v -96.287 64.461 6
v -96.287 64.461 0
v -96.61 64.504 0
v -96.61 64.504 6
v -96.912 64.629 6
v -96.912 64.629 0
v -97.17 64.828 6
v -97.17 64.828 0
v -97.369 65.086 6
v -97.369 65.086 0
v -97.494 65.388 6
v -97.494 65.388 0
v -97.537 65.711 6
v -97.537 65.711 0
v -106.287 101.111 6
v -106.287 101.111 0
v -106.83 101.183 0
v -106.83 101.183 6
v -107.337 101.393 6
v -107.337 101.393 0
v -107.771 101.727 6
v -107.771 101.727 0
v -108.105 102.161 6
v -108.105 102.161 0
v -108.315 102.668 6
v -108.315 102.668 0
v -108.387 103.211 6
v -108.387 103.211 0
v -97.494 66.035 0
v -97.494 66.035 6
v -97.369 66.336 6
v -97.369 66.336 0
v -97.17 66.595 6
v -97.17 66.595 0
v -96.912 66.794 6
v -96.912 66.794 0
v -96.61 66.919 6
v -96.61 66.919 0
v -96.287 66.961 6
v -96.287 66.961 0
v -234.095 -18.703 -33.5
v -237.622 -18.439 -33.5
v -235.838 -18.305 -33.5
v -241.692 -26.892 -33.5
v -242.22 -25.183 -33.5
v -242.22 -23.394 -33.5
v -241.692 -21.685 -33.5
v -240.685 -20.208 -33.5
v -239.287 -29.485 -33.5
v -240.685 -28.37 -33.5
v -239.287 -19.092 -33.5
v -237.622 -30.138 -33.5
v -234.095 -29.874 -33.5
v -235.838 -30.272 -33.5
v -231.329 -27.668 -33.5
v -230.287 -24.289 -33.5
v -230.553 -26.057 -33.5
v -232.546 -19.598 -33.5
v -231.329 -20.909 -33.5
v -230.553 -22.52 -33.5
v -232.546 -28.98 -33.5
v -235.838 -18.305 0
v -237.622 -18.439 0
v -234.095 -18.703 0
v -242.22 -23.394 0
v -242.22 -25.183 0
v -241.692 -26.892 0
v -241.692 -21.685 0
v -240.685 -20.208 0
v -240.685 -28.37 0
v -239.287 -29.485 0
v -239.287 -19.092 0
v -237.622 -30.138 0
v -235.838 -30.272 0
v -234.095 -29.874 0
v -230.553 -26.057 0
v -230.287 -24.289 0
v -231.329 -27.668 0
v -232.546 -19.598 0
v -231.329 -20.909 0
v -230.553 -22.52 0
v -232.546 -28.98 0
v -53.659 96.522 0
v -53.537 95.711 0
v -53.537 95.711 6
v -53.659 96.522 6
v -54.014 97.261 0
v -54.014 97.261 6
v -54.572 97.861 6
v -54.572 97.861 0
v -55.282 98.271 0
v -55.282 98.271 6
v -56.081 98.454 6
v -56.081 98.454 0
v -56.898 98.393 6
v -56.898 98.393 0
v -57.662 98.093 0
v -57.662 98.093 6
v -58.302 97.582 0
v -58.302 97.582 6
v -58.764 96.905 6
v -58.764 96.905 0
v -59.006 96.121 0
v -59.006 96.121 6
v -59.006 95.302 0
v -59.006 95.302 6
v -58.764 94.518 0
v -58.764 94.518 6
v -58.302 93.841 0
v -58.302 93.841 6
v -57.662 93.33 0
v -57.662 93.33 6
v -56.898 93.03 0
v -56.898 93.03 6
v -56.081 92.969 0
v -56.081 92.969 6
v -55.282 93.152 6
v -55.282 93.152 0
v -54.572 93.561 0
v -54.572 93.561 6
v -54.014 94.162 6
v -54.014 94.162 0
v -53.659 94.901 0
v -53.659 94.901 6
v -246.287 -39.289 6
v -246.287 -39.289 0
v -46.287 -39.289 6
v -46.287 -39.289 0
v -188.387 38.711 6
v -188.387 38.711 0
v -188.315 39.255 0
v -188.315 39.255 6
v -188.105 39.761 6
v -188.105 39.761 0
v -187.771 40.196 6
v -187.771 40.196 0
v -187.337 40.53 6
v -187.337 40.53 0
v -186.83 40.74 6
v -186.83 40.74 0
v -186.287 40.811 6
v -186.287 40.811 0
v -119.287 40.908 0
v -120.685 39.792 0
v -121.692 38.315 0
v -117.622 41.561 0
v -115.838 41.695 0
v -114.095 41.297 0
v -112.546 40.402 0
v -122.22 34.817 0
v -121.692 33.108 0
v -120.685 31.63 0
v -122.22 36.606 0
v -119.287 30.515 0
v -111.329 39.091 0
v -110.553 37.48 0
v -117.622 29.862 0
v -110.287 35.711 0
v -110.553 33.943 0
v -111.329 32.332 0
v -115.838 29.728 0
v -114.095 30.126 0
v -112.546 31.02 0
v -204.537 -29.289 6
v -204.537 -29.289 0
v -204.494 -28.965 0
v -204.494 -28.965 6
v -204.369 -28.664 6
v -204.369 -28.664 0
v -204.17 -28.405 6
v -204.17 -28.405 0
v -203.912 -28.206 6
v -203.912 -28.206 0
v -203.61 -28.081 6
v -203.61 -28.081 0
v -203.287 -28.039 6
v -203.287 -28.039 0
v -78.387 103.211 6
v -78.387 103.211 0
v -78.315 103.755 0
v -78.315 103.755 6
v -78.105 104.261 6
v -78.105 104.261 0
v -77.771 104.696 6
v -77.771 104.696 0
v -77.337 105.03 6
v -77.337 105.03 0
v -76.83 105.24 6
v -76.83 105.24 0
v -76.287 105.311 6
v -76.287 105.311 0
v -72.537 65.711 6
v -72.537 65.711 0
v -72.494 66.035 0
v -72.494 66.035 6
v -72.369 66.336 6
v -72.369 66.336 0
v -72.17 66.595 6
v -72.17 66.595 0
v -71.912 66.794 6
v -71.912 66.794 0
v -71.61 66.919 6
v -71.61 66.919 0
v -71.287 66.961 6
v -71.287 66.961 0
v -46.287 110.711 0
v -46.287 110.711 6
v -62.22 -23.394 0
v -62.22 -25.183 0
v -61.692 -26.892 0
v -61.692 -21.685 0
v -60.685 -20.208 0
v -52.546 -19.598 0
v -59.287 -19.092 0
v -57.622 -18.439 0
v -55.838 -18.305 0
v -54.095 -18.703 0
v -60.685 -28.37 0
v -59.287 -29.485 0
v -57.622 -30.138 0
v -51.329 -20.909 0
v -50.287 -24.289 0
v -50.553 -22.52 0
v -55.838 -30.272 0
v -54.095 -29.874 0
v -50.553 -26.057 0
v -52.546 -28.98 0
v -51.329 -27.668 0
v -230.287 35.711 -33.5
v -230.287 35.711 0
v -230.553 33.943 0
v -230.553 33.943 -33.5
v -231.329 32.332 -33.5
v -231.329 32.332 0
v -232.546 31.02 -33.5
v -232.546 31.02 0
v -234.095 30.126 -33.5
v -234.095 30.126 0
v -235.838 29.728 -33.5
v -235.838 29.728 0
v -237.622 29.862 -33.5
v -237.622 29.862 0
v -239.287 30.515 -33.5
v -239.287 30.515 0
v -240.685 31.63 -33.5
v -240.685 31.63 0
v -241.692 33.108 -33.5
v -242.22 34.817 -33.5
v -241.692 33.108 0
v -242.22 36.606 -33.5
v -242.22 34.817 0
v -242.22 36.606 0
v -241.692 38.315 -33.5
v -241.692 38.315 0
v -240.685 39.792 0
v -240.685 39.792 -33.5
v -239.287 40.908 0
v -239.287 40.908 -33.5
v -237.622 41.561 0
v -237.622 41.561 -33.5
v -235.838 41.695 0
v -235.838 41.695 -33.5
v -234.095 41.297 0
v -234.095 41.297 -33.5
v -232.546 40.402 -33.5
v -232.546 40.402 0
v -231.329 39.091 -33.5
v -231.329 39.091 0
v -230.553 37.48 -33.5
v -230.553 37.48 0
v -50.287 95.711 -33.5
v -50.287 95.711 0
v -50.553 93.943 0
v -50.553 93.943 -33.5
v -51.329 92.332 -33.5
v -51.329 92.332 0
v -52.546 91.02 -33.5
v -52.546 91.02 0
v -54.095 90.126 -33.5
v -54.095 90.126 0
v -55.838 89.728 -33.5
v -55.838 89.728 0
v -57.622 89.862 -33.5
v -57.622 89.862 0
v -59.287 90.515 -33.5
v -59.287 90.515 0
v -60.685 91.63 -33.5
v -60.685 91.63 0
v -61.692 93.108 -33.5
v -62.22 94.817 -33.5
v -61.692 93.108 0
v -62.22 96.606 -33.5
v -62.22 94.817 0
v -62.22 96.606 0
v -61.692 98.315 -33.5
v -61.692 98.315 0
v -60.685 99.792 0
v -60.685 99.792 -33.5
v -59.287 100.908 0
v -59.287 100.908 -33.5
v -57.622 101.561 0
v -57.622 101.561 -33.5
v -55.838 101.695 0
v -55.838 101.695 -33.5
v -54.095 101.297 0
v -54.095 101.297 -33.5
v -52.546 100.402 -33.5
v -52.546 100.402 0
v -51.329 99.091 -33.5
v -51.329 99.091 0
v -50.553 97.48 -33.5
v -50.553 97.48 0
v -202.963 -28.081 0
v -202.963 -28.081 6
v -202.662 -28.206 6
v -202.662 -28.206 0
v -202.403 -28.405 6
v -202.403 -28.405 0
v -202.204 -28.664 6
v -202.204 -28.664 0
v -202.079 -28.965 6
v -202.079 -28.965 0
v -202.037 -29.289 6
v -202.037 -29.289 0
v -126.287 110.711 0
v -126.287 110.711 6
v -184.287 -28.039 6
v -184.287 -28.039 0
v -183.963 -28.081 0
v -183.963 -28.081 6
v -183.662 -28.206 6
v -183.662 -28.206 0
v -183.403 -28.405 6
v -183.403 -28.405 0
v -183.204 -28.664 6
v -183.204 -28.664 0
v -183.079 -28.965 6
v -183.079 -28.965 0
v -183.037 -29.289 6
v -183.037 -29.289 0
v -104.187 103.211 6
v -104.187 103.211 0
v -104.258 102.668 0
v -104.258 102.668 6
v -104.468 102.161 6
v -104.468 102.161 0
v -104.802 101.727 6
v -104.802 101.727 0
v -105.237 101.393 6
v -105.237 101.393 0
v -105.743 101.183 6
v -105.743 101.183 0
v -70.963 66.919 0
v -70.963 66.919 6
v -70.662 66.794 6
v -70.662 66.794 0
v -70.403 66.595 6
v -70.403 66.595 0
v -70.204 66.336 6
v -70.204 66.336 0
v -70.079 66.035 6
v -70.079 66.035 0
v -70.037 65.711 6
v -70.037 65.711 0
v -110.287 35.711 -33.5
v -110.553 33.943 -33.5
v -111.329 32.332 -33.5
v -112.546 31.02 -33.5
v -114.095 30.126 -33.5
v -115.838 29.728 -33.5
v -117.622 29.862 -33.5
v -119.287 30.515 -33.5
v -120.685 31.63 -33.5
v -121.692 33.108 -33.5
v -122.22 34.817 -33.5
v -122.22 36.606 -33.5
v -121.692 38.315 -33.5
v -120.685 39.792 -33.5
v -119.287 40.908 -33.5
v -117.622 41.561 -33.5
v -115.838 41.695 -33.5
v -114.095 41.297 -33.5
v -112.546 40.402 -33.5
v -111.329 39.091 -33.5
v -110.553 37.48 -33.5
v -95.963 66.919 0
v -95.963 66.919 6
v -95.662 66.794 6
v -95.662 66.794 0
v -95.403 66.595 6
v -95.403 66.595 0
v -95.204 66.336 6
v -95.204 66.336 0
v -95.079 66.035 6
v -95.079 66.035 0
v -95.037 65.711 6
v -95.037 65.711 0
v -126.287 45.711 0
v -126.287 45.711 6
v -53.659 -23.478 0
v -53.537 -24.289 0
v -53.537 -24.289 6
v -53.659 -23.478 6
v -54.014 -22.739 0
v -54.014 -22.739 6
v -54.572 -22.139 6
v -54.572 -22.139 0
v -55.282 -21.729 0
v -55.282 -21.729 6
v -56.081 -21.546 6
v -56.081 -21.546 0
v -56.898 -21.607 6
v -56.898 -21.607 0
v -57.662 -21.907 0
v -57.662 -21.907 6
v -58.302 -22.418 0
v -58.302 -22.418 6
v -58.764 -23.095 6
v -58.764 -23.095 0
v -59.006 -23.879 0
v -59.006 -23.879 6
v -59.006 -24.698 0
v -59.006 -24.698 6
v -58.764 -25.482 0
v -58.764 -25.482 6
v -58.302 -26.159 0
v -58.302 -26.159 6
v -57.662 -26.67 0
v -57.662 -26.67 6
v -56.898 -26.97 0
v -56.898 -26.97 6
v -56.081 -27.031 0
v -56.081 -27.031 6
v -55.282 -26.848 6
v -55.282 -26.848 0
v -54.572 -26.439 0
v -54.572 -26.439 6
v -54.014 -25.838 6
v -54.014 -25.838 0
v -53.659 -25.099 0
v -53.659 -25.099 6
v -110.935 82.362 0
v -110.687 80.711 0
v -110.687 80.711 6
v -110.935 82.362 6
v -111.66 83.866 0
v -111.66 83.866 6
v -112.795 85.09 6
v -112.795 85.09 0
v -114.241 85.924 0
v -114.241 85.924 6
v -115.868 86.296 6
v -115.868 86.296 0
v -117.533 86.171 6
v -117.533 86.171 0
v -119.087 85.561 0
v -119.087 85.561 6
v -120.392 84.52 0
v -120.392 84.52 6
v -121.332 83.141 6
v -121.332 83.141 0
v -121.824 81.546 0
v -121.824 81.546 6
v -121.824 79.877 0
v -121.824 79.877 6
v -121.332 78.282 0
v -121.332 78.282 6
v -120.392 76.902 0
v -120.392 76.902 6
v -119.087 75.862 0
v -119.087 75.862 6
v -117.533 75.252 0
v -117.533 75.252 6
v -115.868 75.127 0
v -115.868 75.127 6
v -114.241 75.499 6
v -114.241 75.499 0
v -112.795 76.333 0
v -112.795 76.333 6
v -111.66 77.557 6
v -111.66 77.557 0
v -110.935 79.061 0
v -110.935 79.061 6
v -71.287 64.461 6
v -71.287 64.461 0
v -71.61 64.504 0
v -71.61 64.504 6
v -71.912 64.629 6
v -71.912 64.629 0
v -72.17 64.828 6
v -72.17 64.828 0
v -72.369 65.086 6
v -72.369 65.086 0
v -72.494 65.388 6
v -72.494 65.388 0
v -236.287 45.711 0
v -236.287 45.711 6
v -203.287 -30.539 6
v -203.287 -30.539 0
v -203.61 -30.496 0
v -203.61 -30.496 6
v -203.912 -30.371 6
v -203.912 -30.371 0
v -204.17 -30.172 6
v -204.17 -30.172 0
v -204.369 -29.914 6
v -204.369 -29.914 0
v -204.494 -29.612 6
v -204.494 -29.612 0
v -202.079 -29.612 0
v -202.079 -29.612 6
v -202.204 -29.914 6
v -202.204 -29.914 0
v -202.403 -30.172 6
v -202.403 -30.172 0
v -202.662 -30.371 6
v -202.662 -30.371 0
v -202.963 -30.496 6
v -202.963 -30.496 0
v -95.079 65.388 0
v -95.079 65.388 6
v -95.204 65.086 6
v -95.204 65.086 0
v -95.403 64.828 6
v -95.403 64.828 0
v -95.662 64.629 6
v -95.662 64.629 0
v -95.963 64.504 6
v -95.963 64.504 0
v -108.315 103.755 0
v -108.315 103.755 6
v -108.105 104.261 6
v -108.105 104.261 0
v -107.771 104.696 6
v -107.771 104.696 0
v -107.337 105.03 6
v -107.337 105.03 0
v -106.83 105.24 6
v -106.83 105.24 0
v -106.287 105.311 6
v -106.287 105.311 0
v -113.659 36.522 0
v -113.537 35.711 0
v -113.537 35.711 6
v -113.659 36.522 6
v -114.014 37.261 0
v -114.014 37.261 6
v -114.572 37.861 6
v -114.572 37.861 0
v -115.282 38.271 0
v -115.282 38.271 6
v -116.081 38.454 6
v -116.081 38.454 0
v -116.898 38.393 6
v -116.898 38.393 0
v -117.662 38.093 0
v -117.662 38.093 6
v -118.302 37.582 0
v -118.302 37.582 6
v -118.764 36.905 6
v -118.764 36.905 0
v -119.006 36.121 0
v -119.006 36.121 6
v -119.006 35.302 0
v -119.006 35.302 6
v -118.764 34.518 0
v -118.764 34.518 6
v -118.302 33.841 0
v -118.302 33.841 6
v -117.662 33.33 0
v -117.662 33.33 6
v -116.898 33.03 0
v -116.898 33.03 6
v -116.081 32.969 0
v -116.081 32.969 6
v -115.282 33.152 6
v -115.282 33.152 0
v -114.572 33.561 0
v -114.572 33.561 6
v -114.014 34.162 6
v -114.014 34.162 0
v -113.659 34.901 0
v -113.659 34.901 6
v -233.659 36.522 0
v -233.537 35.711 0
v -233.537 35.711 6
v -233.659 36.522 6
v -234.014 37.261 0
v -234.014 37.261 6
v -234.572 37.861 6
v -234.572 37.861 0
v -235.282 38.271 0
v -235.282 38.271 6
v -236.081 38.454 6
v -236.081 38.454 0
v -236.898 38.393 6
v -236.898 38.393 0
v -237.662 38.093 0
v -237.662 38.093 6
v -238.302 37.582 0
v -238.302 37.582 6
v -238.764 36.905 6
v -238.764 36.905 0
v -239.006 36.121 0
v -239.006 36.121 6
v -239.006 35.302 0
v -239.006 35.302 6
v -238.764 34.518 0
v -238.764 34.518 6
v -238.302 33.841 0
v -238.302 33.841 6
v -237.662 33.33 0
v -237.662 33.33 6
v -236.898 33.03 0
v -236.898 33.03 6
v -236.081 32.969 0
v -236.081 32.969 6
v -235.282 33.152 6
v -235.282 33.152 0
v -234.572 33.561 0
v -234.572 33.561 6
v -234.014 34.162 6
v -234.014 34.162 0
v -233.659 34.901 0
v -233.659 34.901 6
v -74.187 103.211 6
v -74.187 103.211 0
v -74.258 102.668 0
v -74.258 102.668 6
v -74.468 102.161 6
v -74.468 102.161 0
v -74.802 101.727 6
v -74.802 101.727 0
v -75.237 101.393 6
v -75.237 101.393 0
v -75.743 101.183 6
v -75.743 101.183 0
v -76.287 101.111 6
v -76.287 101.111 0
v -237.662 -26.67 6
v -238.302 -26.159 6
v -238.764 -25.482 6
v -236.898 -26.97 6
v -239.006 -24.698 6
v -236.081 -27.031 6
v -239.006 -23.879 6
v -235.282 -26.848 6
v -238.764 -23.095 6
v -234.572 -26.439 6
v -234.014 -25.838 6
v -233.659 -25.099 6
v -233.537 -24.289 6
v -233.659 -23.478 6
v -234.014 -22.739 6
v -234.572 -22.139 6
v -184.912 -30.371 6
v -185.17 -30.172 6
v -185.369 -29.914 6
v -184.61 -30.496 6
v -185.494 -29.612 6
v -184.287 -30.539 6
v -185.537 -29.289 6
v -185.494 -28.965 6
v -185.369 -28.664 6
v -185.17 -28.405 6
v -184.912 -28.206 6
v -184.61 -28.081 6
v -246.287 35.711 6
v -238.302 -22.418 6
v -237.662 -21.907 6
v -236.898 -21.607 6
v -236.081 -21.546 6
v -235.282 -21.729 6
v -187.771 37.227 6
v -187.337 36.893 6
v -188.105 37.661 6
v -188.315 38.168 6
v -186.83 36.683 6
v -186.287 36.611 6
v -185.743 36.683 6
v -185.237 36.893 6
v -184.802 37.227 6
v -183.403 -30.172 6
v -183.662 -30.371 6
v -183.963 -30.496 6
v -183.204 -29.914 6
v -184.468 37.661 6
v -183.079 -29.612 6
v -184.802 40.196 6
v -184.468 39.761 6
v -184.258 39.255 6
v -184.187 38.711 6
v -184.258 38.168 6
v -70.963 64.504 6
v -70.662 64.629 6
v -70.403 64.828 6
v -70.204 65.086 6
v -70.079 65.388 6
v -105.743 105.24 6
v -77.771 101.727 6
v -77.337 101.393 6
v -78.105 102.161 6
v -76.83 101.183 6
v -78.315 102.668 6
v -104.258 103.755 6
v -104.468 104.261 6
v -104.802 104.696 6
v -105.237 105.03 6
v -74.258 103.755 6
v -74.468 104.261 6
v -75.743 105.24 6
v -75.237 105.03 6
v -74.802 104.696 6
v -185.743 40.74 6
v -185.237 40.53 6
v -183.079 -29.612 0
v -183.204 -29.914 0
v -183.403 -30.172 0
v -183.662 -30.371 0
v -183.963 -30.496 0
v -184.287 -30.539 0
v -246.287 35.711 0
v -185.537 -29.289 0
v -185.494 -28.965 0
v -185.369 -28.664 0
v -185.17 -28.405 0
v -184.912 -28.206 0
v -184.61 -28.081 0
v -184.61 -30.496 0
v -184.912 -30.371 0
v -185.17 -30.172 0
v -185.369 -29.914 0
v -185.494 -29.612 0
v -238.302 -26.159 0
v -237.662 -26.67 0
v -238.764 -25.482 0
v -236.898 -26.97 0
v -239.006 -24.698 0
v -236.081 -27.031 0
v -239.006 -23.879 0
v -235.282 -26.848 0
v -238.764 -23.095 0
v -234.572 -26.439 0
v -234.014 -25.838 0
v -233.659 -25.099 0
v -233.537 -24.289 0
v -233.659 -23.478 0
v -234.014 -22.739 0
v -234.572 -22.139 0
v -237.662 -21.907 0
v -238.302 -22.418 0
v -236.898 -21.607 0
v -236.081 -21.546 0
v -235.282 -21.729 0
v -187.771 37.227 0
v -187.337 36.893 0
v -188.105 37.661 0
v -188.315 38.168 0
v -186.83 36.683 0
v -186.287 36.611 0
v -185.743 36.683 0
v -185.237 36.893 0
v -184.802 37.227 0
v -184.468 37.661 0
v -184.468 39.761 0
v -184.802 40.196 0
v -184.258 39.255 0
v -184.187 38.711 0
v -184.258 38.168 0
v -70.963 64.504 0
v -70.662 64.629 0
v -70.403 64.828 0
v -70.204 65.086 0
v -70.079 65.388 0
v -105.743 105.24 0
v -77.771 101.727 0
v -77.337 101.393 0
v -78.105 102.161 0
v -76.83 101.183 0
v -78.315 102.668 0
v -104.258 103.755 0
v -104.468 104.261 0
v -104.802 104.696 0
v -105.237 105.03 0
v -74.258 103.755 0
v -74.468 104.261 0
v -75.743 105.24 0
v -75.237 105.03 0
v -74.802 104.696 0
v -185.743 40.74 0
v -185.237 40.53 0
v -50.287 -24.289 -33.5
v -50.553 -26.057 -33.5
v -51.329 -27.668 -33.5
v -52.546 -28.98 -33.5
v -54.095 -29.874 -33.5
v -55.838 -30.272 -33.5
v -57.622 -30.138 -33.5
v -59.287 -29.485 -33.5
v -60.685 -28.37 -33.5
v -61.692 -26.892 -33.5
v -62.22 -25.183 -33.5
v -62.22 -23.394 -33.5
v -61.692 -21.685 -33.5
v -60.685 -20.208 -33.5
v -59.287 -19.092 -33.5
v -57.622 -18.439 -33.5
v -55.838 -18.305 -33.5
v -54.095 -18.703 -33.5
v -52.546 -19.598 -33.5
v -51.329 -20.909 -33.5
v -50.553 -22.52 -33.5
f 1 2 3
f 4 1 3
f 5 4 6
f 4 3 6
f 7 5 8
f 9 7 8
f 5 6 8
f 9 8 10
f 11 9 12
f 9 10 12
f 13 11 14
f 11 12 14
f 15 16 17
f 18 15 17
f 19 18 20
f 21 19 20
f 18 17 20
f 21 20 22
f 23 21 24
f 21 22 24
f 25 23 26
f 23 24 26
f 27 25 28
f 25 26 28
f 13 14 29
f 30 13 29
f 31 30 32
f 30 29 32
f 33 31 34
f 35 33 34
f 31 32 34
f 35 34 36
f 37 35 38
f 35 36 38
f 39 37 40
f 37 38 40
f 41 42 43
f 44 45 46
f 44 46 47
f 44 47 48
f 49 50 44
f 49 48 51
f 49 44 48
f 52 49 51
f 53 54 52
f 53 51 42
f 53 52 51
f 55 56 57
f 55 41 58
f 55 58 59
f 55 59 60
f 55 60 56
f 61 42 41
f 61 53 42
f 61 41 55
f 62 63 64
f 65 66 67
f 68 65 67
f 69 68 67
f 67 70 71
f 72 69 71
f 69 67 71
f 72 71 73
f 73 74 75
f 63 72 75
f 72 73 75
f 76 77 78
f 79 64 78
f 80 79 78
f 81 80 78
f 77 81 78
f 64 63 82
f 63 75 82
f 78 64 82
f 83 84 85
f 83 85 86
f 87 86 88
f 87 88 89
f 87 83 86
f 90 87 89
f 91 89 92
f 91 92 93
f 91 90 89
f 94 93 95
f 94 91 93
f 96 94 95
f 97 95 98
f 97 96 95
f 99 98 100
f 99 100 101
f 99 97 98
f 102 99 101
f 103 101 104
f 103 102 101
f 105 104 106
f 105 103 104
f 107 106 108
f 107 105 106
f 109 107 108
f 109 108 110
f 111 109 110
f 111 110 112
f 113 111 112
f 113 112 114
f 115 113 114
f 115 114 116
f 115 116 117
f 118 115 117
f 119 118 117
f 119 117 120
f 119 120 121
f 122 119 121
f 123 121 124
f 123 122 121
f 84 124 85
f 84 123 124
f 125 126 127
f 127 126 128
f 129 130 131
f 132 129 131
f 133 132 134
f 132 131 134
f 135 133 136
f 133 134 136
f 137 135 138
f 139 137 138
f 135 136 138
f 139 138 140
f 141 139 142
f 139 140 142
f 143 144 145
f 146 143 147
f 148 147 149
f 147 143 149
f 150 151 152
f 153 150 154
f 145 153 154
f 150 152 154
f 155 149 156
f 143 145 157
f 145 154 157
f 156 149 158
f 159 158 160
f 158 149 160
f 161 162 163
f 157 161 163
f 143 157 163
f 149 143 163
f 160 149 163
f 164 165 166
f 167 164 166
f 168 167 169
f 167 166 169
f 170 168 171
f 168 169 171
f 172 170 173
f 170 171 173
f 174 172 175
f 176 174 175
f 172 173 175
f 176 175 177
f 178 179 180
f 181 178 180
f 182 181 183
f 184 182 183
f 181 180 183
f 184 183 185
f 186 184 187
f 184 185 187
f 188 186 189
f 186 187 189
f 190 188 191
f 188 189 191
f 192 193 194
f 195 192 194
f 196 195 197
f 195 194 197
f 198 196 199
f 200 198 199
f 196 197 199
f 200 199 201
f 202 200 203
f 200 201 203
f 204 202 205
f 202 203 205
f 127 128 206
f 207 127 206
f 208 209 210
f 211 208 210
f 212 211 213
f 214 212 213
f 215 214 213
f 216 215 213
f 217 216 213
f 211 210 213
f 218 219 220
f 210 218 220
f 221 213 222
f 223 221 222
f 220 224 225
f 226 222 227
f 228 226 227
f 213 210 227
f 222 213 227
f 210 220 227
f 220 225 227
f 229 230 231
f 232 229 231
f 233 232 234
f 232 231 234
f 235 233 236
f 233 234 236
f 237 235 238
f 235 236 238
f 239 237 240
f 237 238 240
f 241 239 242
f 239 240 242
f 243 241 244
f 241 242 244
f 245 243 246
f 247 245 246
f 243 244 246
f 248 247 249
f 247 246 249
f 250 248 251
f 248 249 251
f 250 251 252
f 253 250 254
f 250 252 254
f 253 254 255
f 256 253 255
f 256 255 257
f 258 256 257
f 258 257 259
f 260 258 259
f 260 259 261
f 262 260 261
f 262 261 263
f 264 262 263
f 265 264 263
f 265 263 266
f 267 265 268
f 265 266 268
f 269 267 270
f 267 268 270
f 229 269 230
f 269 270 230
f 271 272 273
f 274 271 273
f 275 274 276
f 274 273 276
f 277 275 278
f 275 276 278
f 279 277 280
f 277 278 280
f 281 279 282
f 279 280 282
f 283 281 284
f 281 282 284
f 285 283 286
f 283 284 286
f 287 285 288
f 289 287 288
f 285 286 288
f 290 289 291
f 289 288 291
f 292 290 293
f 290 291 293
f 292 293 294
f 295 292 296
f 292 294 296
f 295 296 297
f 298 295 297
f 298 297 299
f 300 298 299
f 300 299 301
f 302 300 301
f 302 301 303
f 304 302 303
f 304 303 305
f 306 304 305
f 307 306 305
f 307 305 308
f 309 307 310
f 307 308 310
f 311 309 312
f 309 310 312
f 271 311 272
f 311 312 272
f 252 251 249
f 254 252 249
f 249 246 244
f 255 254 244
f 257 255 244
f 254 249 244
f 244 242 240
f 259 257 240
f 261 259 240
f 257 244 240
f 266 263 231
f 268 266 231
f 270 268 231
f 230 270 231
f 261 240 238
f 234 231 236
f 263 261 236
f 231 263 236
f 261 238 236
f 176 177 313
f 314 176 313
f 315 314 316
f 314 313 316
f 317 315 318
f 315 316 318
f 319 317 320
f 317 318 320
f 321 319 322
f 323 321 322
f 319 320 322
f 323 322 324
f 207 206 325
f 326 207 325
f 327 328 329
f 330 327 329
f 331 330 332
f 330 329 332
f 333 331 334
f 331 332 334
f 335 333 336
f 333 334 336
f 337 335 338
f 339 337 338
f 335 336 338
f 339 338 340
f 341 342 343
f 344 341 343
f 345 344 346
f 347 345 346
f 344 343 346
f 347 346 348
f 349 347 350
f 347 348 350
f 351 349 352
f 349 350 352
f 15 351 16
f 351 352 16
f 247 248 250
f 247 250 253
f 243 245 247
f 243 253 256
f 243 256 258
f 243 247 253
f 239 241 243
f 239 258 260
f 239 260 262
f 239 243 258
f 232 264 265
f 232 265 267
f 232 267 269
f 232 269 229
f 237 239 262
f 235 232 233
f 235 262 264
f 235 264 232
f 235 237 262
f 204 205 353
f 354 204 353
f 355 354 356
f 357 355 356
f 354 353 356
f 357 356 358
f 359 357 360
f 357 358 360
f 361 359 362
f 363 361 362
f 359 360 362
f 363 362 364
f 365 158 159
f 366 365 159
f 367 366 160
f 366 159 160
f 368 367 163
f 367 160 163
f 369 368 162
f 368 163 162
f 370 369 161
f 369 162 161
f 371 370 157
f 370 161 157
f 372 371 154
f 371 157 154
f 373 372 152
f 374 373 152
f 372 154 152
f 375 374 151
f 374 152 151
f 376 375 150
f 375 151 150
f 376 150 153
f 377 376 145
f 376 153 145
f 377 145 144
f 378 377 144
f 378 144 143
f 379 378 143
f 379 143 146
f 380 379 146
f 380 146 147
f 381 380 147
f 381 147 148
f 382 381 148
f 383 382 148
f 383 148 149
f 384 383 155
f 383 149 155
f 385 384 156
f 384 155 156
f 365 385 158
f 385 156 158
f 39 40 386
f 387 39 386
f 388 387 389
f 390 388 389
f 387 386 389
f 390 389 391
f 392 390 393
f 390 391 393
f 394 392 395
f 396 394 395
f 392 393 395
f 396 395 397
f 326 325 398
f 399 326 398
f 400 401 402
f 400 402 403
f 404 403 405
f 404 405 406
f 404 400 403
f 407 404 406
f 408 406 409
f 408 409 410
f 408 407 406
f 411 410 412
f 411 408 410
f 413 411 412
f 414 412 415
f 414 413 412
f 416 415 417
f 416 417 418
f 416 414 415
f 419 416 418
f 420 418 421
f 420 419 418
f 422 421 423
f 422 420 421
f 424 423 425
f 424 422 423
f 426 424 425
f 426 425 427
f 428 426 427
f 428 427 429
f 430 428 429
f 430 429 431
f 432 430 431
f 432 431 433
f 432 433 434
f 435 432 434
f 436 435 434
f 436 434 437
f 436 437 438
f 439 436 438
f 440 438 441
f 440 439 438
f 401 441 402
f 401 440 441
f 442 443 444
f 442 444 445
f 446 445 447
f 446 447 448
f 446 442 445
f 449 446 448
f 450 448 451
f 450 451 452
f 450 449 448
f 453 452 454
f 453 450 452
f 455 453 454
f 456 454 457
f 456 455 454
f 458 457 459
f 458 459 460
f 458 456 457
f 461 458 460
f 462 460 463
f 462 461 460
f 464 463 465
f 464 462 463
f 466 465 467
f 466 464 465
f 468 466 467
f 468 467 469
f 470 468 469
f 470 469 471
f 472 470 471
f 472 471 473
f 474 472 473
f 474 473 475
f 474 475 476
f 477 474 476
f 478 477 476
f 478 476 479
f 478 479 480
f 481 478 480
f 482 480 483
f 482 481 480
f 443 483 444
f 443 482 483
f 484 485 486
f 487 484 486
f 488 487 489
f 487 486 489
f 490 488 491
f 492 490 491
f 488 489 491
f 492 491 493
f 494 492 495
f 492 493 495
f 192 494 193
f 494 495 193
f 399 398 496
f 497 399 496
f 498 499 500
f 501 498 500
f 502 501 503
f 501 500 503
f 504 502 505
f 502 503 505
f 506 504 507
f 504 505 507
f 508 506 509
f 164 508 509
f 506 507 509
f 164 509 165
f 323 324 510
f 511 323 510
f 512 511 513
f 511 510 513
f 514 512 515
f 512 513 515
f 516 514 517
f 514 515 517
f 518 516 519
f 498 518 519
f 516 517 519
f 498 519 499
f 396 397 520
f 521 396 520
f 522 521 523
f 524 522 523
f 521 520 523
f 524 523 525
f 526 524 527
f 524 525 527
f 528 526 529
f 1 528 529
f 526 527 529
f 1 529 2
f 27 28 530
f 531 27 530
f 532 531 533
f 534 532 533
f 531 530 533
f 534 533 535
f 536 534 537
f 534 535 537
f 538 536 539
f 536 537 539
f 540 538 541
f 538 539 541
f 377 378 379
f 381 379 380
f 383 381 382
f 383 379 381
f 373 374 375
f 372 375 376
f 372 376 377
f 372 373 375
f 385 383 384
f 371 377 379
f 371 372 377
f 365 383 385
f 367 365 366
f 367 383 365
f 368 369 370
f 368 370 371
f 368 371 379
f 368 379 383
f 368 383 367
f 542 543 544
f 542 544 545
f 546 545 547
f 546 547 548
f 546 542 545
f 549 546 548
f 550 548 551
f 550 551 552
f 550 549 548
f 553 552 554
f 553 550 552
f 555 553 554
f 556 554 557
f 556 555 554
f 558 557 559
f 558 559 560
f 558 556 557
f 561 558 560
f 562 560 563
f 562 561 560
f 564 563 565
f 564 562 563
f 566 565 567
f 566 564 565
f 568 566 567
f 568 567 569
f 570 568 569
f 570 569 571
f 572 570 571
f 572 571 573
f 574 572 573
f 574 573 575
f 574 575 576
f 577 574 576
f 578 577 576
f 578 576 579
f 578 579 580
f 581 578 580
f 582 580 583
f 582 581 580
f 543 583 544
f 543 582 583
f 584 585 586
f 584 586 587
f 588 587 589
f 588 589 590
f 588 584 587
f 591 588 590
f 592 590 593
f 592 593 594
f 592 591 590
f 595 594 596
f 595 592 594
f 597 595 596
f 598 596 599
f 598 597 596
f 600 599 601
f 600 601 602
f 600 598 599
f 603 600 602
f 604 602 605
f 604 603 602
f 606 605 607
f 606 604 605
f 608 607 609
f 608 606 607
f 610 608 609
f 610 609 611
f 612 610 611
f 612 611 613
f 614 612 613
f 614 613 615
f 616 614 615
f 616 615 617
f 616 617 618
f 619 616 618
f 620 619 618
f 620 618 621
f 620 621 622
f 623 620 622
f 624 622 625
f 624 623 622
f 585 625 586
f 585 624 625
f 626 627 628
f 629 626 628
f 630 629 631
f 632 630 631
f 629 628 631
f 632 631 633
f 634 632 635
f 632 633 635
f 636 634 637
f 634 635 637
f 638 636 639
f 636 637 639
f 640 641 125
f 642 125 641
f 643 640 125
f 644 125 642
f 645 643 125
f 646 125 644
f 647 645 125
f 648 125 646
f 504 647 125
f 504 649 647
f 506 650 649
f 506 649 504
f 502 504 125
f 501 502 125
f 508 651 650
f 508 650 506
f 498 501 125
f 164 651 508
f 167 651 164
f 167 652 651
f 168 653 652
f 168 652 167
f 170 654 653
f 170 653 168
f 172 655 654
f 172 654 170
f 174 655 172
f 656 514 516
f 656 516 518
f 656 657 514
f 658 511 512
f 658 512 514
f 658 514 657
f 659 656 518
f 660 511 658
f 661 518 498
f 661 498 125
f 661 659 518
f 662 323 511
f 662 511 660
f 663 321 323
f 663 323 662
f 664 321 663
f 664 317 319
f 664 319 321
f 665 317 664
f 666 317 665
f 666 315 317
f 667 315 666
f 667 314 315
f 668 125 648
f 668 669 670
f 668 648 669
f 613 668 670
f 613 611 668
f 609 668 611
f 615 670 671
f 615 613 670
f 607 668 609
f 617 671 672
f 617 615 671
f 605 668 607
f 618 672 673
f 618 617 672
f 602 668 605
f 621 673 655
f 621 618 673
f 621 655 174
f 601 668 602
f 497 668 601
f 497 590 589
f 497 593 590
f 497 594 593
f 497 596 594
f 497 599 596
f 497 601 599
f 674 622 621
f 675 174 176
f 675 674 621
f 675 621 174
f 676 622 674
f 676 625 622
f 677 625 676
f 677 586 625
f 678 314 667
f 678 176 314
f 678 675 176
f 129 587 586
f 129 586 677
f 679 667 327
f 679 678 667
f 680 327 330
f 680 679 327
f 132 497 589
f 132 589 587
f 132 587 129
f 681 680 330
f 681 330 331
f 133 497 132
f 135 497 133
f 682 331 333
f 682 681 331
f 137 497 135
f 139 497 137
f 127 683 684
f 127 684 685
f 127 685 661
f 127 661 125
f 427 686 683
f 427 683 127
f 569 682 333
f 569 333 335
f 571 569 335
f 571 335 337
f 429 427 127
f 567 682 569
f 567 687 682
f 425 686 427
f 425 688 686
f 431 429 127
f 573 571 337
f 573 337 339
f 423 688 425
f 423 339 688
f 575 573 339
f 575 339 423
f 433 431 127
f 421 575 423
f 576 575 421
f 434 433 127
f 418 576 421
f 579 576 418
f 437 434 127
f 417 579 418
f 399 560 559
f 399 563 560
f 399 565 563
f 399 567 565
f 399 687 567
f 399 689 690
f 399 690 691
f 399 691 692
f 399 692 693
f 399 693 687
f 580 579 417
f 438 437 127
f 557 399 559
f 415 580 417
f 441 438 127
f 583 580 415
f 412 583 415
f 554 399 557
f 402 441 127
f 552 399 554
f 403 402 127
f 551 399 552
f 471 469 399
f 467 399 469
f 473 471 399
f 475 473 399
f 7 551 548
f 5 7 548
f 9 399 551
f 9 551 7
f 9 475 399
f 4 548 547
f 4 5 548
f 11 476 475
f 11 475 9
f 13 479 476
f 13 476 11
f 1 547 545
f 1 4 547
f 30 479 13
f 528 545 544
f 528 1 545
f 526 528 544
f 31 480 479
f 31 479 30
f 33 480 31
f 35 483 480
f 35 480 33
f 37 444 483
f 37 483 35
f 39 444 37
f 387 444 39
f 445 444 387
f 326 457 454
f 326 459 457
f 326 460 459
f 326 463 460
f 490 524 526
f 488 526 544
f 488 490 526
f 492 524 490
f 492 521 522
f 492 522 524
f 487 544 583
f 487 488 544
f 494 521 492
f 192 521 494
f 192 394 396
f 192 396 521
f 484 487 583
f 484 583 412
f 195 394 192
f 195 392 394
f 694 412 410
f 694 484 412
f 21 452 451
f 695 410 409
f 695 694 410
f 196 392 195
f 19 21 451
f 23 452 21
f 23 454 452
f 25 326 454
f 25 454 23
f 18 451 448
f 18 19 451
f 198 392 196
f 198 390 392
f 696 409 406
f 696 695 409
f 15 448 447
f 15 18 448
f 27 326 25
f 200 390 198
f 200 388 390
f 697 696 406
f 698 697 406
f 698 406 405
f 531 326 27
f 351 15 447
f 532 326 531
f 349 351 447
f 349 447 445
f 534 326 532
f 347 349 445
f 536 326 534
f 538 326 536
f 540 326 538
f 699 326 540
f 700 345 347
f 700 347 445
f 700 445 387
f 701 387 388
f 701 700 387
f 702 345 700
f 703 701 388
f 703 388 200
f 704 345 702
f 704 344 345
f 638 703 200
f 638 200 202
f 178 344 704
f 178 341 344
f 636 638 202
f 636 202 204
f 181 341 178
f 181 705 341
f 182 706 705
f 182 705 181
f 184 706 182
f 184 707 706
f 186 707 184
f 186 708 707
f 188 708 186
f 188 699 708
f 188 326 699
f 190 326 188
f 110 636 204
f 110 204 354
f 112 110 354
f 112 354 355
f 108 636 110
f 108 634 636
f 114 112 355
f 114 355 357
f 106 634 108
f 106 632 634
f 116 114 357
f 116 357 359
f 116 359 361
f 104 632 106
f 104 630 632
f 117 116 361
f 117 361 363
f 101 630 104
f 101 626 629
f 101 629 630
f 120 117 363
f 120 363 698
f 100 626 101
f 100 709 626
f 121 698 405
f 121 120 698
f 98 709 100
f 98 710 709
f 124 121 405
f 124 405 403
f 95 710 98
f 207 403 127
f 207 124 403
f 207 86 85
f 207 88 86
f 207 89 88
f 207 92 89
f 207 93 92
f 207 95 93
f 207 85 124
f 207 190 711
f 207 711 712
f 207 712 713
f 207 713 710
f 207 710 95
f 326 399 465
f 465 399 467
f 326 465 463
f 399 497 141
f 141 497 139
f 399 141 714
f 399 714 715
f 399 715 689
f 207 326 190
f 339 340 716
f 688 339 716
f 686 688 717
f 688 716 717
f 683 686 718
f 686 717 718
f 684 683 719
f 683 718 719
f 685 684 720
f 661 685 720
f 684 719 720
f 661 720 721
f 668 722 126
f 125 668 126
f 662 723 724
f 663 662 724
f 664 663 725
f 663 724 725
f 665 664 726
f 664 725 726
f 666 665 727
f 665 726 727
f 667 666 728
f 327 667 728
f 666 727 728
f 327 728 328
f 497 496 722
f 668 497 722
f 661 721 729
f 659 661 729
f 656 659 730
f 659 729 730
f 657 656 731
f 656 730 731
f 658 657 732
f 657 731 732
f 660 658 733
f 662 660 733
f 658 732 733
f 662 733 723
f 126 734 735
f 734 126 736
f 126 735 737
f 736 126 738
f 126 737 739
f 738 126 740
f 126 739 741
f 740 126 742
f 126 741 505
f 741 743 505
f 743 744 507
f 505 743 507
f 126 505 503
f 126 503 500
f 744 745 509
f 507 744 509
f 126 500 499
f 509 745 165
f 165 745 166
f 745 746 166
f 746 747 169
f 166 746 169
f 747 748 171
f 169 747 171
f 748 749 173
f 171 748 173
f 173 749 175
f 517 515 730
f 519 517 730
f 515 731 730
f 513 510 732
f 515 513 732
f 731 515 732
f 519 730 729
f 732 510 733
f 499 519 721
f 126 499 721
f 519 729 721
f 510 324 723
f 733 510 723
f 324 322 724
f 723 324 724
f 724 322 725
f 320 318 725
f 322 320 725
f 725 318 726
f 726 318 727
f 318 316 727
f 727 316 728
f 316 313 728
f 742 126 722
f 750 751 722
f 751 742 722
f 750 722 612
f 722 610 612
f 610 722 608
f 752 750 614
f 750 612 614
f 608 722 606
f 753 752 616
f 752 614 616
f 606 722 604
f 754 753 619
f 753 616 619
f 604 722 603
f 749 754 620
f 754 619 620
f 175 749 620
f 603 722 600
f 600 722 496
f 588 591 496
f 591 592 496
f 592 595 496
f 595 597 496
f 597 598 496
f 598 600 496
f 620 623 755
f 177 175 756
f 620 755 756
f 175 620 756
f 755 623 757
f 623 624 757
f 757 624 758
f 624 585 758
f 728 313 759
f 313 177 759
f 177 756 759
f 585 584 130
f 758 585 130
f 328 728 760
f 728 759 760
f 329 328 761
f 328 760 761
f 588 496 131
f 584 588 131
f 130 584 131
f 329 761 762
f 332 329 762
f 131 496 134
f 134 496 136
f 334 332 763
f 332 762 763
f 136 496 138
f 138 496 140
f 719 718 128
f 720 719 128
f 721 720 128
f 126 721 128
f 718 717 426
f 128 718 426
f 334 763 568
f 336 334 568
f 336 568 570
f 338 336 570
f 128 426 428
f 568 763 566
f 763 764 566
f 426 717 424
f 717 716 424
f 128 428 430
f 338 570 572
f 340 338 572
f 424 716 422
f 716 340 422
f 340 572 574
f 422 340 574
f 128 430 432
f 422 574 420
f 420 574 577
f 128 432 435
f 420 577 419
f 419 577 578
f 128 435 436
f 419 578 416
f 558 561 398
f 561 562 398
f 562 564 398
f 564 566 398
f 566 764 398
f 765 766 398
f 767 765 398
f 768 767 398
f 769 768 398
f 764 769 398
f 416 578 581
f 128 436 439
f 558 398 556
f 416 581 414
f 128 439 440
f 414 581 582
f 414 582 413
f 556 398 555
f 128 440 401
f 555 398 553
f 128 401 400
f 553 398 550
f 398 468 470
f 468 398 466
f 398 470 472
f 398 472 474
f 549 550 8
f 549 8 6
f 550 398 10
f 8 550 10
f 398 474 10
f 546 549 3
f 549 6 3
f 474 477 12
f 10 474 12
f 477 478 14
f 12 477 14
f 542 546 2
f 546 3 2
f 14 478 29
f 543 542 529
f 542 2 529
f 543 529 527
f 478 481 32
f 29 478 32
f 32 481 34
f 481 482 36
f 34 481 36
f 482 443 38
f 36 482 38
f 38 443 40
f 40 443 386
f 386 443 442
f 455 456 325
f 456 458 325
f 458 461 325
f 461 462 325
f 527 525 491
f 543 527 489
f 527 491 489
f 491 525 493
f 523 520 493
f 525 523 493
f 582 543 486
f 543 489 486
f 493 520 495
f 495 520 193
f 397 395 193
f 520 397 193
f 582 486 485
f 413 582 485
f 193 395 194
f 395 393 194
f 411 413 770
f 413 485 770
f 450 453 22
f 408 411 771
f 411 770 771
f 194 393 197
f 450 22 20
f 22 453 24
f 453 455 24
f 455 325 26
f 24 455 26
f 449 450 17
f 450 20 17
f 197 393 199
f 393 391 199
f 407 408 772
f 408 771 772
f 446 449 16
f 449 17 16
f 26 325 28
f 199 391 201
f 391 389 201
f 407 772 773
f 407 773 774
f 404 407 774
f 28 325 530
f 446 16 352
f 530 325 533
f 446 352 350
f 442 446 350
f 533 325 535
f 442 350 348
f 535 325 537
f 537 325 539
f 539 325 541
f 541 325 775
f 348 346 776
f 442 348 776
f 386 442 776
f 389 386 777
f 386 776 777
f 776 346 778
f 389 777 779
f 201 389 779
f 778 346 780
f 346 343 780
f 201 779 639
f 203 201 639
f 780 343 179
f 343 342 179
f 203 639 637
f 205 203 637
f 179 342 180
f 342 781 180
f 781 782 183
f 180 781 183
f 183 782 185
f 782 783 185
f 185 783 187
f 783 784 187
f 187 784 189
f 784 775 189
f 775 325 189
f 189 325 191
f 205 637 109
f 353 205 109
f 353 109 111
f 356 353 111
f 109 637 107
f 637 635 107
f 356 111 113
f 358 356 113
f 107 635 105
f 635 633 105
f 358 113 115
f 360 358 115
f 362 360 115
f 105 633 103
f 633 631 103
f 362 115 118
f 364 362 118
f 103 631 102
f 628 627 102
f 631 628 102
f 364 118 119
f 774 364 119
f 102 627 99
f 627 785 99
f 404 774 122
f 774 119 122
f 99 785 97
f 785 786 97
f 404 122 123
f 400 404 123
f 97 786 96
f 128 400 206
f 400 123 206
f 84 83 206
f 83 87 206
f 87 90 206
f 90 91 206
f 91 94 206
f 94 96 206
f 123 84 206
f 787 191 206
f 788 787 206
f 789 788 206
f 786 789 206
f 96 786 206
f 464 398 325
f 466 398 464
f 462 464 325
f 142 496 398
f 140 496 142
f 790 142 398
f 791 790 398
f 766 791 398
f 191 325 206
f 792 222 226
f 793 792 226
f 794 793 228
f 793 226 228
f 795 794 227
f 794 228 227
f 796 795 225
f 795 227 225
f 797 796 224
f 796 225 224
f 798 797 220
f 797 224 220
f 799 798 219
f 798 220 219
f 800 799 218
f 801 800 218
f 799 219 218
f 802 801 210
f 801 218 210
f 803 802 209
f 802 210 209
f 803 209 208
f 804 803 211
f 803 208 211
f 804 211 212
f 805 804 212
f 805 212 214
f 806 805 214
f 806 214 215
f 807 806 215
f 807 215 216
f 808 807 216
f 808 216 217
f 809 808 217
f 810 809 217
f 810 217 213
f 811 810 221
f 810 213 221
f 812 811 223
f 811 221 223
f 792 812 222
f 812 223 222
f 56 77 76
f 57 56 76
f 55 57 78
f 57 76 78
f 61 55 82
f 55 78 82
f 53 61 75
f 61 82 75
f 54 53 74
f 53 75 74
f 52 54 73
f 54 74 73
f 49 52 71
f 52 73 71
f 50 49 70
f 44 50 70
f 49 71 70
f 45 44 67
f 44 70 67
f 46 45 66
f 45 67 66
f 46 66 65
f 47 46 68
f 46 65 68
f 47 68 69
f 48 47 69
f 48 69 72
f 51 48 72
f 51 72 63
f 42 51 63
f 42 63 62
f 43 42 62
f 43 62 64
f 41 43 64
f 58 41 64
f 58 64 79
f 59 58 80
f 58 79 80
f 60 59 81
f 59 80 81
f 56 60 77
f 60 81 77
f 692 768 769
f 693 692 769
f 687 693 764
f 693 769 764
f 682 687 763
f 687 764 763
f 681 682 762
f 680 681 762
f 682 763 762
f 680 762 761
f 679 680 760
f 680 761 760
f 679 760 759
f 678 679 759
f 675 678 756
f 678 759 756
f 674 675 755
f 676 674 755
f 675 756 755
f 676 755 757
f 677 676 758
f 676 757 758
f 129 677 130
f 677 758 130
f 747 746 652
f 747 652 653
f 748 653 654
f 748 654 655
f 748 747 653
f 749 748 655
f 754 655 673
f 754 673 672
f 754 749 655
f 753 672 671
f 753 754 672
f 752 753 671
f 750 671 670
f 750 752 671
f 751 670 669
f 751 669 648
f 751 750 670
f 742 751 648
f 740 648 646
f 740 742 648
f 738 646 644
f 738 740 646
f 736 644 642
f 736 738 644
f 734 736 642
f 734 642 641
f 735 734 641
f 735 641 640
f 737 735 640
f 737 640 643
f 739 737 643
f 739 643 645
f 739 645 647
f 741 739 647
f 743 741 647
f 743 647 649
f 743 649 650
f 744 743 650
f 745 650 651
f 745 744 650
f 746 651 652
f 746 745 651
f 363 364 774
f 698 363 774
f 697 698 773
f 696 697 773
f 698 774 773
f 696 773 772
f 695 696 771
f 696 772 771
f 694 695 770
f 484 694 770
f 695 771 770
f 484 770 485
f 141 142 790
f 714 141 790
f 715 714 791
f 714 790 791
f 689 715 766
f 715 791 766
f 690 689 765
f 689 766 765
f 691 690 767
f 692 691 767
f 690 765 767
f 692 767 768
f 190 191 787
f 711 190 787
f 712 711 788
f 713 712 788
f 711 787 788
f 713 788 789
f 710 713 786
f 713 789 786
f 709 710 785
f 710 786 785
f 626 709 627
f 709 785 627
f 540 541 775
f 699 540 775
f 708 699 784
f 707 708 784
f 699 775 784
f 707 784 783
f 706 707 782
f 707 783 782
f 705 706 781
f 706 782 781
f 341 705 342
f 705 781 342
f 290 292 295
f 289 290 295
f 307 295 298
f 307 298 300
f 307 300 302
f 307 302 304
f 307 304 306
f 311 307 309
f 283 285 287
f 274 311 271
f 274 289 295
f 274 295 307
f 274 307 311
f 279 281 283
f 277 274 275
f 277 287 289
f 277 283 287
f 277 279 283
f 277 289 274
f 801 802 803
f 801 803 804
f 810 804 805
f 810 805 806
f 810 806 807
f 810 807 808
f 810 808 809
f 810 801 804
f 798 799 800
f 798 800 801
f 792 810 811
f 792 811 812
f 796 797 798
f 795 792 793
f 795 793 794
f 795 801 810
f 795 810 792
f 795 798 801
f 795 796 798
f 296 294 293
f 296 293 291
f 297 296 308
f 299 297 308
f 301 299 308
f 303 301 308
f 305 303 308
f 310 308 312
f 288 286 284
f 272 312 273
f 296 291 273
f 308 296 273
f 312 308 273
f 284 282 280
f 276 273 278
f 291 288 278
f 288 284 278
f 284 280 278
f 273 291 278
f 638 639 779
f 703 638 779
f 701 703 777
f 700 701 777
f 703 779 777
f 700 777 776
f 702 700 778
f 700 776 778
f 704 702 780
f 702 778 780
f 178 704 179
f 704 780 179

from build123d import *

# Parameters (mm, degrees)
F0_R     = 2.75
F0_R_2   = 5.6
F1_DEPTH = 6
F2_R     = 6
F3_DEPTH = 33.5


with BuildPart() as f1:
    # F0 (on Top) → F1 (new body)
    with BuildSketch(Plane.XY):
        Polygon((-126.28656, 110.711451), (-126.28656, 45.711451), (-236.28656, 45.711451), (-246.28656, 35.711451), (-246.28656, -39.288549), (-46.28656, -39.288549), (-46.28656, 110.711451), align=None)
        with Locations((-236.28656, -24.288549)):
            Circle(F0_R, mode=Mode.SUBTRACT)
        with BuildLine():
            ThreePointArc((-203.28656, -28.038549), (-202.402677, -28.404666), (-202.03656, -29.288549))
            ThreePointArc((-202.03656, -29.288549), (-202.402677, -30.172432), (-203.28656, -30.538549))
            ThreePointArc((-203.28656, -30.538549), (-204.170443, -30.172432), (-204.53656, -29.288549))
            ThreePointArc((-204.53656, -29.288549), (-204.170443, -28.404666), (-203.28656, -28.038549))
        make_face(mode=Mode.SUBTRACT)
        with BuildLine():
            ThreePointArc((-184.28656, -28.038549), (-183.402677, -28.404666), (-183.03656, -29.288549))
            ThreePointArc((-183.03656, -29.288549), (-183.402677, -30.172432), (-184.28656, -30.538549))
            ThreePointArc((-184.28656, -30.538549), (-185.170443, -30.172432), (-185.53656, -29.288549))
            ThreePointArc((-185.53656, -29.288549), (-185.170443, -28.404666), (-184.28656, -28.038549))
        make_face(mode=Mode.SUBTRACT)
        with Locations((-56.28656, -24.288549)):
            Circle(F0_R, mode=Mode.SUBTRACT)
        with Locations((-236.28656, 35.711451)):
            Circle(F0_R, mode=Mode.SUBTRACT)
        with BuildLine():
            ThreePointArc((-186.28656, 40.811451), (-184.801636, 40.196375), (-184.18656, 38.711451))
            ThreePointArc((-184.18656, 38.711451), (-184.801636, 37.226527), (-186.28656, 36.611451))
            ThreePointArc((-186.28656, 36.611451), (-187.771484, 37.226527), (-188.38656, 38.711451))
            ThreePointArc((-188.38656, 38.711451), (-187.771484, 40.196375), (-186.28656, 40.811451))
        make_face(mode=Mode.SUBTRACT)
        with Locations((-116.28656, 35.711451)):
            Circle(F0_R, mode=Mode.SUBTRACT)
        with BuildLine():
            ThreePointArc((-96.28656, 66.961451), (-95.402677, 66.595334), (-95.03656, 65.711451))
            ThreePointArc((-95.03656, 65.711451), (-95.402677, 64.827568), (-96.28656, 64.461451))
            ThreePointArc((-96.28656, 64.461451), (-97.170443, 64.827568), (-97.53656, 65.711451))
            ThreePointArc((-97.53656, 65.711451), (-97.170443, 66.595334), (-96.28656, 66.961451))
        make_face(mode=Mode.SUBTRACT)
        with BuildLine():
            ThreePointArc((-71.28656, 66.961451), (-70.402677, 66.595334), (-70.03656, 65.711451))
            ThreePointArc((-70.03656, 65.711451), (-70.402677, 64.827568), (-71.28656, 64.461451))
            ThreePointArc((-71.28656, 64.461451), (-72.170443, 64.827568), (-72.53656, 65.711451))
            ThreePointArc((-72.53656, 65.711451), (-72.170443, 66.595334), (-71.28656, 66.961451))
        make_face(mode=Mode.SUBTRACT)
        with Locations((-116.28656, 80.711451)):
            Circle(F0_R_2, mode=Mode.SUBTRACT)
        with BuildLine():
            ThreePointArc((-106.28656, 105.311451), (-104.801636, 104.696375), (-104.18656, 103.211451))
            ThreePointArc((-104.18656, 103.211451), (-104.801636, 101.726527), (-106.28656, 101.111451))
            ThreePointArc((-106.28656, 101.111451), (-107.771484, 101.726527), (-108.38656, 103.211451))
            ThreePointArc((-108.38656, 103.211451), (-107.771484, 104.696375), (-106.28656, 105.311451))
        make_face(mode=Mode.SUBTRACT)
        with BuildLine():
            ThreePointArc((-76.28656, 105.311451), (-74.801636, 104.696375), (-74.18656, 103.211451))
            ThreePointArc((-74.18656, 103.211451), (-74.801636, 101.726527), (-76.28656, 101.111451))
            ThreePointArc((-76.28656, 101.111451), (-77.771484, 101.726527), (-78.38656, 103.211451))
            ThreePointArc((-78.38656, 103.211451), (-77.771484, 104.696375), (-76.28656, 105.311451))
        make_face(mode=Mode.SUBTRACT)
        with Locations((-56.28656, 95.711451)):
            Circle(F0_R, mode=Mode.SUBTRACT)
    extrude(amount=F1_DEPTH)


with BuildPart() as f3:
    # F2 (on face) → F3 (new body)
    with BuildSketch(Plane(origin=(0, 0, 0), x_dir=(1, 0, 0), z_dir=(0, 0, -1))):
        with Locations((-236.28656, 24.288549)):
            Circle(F2_R)
        with Locations((-236.28656, -35.711451)):
            Circle(F2_R)
        with Locations((-56.28656, 24.288549)):
            Circle(F2_R)
        with Locations((-56.28656, -95.711451)):
            Circle(F2_R)
        with Locations((-116.28656, -35.711451)):
            Circle(F2_R)
    extrude(amount=F3_DEPTH)


solid = Compound([f1.part, f3.part])
